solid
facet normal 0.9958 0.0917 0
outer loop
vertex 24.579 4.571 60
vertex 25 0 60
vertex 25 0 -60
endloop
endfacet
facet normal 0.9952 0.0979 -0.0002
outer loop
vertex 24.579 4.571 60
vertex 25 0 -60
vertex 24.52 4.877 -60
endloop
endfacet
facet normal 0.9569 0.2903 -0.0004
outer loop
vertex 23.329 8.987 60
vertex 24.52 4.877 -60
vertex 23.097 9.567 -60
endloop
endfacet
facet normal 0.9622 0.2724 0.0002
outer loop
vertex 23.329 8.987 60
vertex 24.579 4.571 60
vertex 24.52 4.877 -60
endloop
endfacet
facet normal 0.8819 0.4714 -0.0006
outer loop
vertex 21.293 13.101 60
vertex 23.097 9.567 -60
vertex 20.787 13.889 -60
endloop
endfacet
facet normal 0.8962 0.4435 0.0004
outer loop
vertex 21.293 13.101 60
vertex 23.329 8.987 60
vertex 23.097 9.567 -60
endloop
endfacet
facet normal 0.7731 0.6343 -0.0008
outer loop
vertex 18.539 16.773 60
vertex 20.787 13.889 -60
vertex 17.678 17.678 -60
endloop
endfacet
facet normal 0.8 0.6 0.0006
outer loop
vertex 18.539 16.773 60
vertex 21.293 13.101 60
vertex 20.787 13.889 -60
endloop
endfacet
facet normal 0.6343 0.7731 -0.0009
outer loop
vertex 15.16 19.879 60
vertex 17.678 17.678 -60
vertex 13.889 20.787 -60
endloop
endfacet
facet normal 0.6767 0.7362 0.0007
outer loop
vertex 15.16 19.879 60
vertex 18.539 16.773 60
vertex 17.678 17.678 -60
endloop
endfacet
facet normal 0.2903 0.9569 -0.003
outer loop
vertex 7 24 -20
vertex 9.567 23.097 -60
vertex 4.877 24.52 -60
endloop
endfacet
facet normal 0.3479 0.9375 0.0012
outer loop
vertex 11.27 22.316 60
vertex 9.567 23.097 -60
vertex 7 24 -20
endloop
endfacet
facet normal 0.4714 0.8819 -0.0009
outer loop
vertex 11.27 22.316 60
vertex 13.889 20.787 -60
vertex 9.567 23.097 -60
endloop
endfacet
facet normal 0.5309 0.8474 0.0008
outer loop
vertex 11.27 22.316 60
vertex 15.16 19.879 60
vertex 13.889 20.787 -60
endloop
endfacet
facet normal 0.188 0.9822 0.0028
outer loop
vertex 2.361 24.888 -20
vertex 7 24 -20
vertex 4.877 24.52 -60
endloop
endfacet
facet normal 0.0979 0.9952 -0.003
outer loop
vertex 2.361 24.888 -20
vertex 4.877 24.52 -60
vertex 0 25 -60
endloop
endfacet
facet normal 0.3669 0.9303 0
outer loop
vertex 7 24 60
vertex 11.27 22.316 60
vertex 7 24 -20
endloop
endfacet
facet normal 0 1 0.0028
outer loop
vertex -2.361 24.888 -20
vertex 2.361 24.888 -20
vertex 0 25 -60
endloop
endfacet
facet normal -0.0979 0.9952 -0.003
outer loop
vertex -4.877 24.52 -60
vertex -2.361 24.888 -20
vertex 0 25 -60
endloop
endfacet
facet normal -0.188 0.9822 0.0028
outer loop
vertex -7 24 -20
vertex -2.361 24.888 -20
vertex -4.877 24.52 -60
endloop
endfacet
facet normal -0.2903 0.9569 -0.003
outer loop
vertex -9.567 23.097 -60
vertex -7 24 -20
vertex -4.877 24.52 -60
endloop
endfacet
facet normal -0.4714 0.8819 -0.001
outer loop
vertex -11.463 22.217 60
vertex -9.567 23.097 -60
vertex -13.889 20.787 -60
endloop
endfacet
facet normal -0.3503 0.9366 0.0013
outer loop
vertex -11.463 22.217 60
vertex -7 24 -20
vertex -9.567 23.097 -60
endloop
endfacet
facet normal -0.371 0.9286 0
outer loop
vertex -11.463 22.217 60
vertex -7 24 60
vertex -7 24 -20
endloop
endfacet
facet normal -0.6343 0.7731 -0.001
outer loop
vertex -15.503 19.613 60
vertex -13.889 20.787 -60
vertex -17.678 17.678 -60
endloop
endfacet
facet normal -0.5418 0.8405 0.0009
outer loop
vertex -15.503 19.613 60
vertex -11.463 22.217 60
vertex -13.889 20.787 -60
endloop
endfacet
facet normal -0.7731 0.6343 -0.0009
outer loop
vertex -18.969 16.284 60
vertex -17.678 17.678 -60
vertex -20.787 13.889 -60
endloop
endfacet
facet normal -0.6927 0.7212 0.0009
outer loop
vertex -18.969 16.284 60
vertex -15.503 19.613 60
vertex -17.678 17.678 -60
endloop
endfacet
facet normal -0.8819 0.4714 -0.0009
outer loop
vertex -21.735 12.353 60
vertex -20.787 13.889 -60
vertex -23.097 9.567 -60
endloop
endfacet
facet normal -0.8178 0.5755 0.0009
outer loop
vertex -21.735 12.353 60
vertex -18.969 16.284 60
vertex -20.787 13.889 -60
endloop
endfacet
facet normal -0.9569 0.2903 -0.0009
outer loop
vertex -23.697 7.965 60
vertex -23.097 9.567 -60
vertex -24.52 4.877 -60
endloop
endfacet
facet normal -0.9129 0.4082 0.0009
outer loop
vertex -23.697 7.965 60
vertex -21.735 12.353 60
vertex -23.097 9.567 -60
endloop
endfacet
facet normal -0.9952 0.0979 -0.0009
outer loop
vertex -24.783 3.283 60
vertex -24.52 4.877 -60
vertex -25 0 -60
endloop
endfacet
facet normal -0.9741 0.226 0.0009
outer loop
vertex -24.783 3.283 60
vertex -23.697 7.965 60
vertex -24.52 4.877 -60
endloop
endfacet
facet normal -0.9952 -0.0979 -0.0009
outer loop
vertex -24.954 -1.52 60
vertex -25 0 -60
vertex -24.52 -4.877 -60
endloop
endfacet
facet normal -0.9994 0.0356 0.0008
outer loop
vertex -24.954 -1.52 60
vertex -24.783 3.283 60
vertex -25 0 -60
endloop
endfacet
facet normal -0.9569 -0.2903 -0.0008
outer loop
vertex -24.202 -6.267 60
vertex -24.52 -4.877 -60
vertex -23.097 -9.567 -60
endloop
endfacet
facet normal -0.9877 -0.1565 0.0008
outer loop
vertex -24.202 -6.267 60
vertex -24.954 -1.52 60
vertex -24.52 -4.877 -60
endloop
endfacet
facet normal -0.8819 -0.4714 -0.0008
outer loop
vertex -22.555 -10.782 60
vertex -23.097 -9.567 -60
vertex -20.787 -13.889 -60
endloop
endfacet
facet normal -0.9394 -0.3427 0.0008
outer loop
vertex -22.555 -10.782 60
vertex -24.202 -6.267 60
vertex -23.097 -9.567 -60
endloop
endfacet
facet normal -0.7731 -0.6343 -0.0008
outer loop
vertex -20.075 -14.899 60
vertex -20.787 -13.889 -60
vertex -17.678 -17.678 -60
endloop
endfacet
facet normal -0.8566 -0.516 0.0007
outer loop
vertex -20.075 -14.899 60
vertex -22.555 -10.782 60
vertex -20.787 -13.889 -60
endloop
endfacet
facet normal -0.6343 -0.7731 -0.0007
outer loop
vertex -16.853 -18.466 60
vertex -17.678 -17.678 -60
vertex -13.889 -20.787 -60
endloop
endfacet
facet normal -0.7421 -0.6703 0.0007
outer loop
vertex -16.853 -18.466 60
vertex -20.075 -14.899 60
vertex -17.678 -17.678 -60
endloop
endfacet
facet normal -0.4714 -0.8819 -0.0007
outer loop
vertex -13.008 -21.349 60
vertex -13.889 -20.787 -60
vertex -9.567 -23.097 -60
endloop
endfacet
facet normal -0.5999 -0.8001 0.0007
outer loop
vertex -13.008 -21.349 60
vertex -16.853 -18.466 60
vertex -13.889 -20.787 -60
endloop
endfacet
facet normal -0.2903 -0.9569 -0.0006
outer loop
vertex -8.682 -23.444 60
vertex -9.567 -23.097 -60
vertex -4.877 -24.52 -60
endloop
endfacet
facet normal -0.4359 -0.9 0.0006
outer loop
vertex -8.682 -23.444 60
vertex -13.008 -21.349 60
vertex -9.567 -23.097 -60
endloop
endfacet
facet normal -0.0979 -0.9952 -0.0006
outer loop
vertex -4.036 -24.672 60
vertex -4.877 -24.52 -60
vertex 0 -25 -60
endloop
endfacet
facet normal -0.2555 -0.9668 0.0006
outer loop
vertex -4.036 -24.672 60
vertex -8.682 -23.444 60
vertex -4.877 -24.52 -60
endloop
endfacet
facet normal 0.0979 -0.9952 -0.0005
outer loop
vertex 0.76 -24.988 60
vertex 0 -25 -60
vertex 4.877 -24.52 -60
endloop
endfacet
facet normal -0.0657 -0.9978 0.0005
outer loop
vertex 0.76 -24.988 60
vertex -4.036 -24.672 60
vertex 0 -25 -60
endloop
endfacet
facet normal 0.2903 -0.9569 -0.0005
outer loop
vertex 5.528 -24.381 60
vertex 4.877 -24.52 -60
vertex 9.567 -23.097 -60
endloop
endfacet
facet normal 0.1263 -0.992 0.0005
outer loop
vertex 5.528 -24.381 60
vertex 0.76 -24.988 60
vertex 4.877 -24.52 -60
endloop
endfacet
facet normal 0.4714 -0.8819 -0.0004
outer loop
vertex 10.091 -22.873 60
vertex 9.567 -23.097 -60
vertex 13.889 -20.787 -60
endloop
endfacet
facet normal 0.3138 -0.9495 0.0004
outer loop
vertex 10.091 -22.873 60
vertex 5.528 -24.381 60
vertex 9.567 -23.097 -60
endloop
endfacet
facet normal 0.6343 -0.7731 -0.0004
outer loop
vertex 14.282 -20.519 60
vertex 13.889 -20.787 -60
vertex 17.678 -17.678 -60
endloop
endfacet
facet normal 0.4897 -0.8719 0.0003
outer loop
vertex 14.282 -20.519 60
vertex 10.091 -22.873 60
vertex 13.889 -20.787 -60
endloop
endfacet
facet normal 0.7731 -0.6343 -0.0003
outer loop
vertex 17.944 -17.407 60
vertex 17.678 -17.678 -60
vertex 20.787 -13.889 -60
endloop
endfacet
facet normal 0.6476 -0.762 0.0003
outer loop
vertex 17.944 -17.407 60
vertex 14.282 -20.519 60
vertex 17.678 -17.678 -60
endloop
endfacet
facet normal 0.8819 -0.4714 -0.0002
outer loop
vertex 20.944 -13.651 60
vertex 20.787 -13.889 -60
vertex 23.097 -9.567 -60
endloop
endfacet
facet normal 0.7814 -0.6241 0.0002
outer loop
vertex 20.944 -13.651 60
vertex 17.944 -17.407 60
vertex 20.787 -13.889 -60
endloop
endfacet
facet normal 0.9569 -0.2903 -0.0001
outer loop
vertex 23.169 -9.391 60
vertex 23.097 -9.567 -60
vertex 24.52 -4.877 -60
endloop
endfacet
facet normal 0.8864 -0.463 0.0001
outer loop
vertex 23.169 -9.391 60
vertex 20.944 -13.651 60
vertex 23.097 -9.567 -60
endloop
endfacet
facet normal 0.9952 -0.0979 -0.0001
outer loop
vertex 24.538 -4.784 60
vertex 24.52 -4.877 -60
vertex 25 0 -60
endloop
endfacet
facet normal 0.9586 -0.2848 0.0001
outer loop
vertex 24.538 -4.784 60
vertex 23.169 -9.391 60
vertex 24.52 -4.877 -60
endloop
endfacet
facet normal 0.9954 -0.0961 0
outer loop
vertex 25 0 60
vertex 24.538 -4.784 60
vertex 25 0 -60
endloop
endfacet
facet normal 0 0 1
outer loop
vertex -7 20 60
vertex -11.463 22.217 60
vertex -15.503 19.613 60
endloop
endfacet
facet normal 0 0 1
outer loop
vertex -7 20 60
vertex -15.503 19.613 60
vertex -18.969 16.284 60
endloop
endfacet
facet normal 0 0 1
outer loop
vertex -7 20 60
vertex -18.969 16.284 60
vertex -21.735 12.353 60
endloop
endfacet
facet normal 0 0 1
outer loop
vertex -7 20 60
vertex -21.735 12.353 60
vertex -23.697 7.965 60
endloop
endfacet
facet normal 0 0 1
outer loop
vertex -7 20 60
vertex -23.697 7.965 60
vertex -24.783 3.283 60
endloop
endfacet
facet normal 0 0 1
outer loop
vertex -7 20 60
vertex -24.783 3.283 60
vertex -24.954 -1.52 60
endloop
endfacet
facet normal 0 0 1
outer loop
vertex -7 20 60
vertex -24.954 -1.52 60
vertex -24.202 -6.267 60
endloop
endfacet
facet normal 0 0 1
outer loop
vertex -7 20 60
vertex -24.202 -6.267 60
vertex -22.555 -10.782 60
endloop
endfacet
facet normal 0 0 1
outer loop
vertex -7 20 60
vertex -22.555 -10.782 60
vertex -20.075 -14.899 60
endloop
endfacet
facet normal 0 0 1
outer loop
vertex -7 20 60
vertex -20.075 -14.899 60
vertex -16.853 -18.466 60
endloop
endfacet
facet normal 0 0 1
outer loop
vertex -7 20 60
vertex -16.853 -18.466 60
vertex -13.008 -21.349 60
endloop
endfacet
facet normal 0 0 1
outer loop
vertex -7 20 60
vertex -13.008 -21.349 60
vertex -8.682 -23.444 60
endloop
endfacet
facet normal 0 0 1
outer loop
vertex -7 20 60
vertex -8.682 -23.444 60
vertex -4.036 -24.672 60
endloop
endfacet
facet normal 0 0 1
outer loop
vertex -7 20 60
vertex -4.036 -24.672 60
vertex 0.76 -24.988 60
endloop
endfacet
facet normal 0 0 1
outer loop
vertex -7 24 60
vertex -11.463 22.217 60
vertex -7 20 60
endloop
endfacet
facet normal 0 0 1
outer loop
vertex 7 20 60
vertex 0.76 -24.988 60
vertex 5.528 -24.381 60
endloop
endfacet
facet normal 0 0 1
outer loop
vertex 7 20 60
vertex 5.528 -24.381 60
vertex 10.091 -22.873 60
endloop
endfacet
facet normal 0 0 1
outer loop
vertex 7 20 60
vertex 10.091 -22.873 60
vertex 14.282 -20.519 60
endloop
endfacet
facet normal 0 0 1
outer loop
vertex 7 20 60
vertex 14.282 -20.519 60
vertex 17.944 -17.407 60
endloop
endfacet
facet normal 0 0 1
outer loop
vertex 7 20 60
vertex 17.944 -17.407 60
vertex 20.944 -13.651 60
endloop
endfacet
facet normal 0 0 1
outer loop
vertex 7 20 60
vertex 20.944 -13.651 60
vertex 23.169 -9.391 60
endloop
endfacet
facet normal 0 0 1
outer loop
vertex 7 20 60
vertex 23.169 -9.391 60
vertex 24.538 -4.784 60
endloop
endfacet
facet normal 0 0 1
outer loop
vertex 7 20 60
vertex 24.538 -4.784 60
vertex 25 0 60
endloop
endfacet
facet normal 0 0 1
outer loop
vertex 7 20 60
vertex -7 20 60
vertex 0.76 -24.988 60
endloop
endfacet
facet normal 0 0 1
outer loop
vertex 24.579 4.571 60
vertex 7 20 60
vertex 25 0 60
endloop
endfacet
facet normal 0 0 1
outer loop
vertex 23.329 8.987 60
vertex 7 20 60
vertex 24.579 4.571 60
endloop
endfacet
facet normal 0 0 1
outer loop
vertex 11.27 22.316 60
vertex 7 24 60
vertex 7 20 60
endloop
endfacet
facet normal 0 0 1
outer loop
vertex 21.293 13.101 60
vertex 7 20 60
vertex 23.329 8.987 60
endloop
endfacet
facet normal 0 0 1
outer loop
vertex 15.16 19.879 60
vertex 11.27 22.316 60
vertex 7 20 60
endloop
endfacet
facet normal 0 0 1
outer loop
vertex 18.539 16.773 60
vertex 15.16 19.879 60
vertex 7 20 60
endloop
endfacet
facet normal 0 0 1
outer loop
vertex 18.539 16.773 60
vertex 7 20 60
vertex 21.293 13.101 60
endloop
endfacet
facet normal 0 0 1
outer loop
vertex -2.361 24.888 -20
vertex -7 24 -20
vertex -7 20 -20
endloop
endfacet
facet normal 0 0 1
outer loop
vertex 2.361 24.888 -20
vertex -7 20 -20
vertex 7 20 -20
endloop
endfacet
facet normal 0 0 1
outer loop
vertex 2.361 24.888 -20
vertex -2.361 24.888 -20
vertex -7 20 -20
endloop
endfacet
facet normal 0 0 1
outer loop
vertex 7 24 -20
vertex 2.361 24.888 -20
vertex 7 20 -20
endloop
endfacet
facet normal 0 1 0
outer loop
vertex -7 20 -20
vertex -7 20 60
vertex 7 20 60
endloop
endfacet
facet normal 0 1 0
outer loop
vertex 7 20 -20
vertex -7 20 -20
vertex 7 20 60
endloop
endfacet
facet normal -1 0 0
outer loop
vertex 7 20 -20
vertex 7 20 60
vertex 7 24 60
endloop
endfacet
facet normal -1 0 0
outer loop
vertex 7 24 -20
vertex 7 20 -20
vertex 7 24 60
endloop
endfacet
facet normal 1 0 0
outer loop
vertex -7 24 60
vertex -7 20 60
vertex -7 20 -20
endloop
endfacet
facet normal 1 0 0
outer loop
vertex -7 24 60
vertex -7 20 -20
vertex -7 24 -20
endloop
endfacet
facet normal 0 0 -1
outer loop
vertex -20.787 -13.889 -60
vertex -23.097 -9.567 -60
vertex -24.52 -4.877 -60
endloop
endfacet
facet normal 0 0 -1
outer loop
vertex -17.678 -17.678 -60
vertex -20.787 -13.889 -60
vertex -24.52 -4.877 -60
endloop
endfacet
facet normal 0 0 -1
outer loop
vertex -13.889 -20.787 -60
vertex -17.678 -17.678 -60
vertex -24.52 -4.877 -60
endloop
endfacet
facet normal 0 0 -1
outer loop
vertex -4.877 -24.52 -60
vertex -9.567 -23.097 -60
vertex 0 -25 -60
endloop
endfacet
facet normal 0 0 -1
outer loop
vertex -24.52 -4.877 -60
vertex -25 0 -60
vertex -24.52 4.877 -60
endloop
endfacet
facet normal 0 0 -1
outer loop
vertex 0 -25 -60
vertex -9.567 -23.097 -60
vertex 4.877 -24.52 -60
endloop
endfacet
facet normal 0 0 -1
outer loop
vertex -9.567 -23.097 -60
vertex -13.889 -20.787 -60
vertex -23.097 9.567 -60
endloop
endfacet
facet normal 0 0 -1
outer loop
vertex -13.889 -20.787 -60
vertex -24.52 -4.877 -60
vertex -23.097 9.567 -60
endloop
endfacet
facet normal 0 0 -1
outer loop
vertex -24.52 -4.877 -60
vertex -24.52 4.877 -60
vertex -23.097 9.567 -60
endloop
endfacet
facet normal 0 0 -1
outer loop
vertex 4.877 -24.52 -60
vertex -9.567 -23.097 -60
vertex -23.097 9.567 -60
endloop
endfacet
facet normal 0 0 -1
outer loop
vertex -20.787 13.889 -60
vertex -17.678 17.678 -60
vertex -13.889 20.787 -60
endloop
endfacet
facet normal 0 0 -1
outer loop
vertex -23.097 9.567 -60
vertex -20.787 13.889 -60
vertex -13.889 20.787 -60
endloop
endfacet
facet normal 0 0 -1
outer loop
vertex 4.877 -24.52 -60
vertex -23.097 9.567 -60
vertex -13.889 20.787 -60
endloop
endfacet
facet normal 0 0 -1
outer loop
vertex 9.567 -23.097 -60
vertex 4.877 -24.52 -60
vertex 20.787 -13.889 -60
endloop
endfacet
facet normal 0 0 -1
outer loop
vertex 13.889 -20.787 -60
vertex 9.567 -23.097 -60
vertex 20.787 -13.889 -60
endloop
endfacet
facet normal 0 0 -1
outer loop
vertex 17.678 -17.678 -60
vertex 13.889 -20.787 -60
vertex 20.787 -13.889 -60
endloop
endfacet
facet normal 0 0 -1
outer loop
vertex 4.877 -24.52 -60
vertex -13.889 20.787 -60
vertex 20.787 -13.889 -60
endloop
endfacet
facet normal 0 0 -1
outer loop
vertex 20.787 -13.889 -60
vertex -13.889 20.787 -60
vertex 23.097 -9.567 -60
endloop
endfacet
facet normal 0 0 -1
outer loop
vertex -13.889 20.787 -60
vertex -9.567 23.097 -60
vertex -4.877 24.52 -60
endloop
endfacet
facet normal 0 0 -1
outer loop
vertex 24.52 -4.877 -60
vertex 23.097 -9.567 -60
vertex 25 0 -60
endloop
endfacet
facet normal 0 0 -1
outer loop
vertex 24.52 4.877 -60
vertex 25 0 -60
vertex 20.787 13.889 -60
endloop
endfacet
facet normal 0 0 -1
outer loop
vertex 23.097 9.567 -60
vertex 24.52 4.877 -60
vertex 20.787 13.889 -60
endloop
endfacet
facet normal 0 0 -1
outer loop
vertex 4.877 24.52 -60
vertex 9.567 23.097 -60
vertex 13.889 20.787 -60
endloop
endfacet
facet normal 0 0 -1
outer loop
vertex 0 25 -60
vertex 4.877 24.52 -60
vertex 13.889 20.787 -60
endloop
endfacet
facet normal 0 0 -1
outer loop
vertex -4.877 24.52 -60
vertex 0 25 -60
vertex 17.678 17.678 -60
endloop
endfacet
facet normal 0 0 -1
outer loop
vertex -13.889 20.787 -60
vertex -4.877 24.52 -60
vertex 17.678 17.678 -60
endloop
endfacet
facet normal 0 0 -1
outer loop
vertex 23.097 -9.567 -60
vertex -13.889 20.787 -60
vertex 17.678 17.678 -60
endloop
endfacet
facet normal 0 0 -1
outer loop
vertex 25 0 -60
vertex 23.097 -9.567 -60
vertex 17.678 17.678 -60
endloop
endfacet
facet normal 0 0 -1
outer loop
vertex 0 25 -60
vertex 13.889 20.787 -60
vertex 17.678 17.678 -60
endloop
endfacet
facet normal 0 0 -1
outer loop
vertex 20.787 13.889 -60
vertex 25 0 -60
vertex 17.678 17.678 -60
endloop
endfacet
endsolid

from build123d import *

# Parameters (mm, degrees)
SKETCH1_R           = 25
BOSS_EXTRUDE1_DEPTH = 60
SKETCH2_W           = 14
SKETCH2_H           = 10
CUT_EXTRUDE1_DEPTH  = 80


with BuildPart() as part:
    # Sketch1 → Boss-Extrude1 (new, symmetric)
    with BuildSketch(Plane.XY):
        Circle(SKETCH1_R)
    extrude(amount=BOSS_EXTRUDE1_DEPTH, both=True)

    # Sketch2 → Cut-Extrude1 (cut)
    with BuildSketch(Plane.XY.offset(60)):
        with Locations((0, 25)):
            Rectangle(SKETCH2_W, SKETCH2_H)
    extrude(amount=-CUT_EXTRUDE1_DEPTH, mode=Mode.SUBTRACT)


solid = part.part
